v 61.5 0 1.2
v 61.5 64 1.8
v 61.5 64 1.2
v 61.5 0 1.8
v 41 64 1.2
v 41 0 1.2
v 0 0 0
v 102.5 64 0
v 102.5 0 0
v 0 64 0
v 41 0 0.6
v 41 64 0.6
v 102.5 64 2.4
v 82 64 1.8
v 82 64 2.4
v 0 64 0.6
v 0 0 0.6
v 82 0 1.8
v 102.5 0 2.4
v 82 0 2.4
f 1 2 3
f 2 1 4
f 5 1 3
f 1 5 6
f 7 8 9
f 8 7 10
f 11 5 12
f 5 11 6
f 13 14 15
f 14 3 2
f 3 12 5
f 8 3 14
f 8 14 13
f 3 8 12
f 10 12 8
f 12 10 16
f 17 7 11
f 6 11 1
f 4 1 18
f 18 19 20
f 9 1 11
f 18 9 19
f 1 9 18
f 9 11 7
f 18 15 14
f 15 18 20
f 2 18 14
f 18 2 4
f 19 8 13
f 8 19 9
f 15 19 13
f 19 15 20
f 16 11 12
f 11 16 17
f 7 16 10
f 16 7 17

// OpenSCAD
cardWidth = 41;
cardDepth = 64;
widthOffsetPercent = .5;
depthOffsetPercent = .55;
offsetCardWidth = cardWidth*widthOffsetPercent;
offsetCardDepth = cardDepth*depthOffsetPercent;
cardHeight = .3;
stepHeight = 2*cardHeight;

function getCardWidth() = cardWidth;
function getCardDepth() = cardDepth;
function getOffsetCardWidth() = offsetCardWidth;
function getOffsetCardDepth() = offsetCardDepth;
function getInsertStepHeight() = stepHeight;
function getColor(number) = [.2*number, 0*number, .2*number,];
function getMinOuterDimensions(direction, numberOfCards, insertTolerance) = direction == "depth"
  ? [
      cardWidth + insertTolerance,
      cardDepth + (numberOfCards - 1)*offsetCardDepth + insertTolerance,
      (numberOfCards + 1)*stepHeight + insertTolerance
  ]
  : [
    cardWidth + (numberOfCards - 1)*offsetCardWidth + insertTolerance,
    cardDepth + insertTolerance,
    (numberOfCards + 1)*stepHeight + insertTolerance,
  ];

module damageInsert (
  numberOfCards,
  direction = "depth",
  insertTolerance = 1
) {
  cube([cardWidth, cardDepth, stepHeight]);

  numberOfAdditionalCards = numberOfCards - 1;
  for (i = [1: numberOfAdditionalCards]) {
    color(getColor(i))
    if (direction == "depth") {
      translate([0, cardDepth + (i - 1)*offsetCardDepth, 0])
      cube([cardWidth, offsetCardDepth, (i+1)*stepHeight]);
    } else {
      translate([cardWidth + (i - 1)*offsetCardWidth, 0, 0])
      cube([offsetCardWidth, cardDepth, (i+1)*stepHeight]);
    }
  }

  echo("Min Outer Dimensions", getMinOuterDimensions(direction, numberOfCards, insertTolerance));
}

damageInsert(4, "width");
